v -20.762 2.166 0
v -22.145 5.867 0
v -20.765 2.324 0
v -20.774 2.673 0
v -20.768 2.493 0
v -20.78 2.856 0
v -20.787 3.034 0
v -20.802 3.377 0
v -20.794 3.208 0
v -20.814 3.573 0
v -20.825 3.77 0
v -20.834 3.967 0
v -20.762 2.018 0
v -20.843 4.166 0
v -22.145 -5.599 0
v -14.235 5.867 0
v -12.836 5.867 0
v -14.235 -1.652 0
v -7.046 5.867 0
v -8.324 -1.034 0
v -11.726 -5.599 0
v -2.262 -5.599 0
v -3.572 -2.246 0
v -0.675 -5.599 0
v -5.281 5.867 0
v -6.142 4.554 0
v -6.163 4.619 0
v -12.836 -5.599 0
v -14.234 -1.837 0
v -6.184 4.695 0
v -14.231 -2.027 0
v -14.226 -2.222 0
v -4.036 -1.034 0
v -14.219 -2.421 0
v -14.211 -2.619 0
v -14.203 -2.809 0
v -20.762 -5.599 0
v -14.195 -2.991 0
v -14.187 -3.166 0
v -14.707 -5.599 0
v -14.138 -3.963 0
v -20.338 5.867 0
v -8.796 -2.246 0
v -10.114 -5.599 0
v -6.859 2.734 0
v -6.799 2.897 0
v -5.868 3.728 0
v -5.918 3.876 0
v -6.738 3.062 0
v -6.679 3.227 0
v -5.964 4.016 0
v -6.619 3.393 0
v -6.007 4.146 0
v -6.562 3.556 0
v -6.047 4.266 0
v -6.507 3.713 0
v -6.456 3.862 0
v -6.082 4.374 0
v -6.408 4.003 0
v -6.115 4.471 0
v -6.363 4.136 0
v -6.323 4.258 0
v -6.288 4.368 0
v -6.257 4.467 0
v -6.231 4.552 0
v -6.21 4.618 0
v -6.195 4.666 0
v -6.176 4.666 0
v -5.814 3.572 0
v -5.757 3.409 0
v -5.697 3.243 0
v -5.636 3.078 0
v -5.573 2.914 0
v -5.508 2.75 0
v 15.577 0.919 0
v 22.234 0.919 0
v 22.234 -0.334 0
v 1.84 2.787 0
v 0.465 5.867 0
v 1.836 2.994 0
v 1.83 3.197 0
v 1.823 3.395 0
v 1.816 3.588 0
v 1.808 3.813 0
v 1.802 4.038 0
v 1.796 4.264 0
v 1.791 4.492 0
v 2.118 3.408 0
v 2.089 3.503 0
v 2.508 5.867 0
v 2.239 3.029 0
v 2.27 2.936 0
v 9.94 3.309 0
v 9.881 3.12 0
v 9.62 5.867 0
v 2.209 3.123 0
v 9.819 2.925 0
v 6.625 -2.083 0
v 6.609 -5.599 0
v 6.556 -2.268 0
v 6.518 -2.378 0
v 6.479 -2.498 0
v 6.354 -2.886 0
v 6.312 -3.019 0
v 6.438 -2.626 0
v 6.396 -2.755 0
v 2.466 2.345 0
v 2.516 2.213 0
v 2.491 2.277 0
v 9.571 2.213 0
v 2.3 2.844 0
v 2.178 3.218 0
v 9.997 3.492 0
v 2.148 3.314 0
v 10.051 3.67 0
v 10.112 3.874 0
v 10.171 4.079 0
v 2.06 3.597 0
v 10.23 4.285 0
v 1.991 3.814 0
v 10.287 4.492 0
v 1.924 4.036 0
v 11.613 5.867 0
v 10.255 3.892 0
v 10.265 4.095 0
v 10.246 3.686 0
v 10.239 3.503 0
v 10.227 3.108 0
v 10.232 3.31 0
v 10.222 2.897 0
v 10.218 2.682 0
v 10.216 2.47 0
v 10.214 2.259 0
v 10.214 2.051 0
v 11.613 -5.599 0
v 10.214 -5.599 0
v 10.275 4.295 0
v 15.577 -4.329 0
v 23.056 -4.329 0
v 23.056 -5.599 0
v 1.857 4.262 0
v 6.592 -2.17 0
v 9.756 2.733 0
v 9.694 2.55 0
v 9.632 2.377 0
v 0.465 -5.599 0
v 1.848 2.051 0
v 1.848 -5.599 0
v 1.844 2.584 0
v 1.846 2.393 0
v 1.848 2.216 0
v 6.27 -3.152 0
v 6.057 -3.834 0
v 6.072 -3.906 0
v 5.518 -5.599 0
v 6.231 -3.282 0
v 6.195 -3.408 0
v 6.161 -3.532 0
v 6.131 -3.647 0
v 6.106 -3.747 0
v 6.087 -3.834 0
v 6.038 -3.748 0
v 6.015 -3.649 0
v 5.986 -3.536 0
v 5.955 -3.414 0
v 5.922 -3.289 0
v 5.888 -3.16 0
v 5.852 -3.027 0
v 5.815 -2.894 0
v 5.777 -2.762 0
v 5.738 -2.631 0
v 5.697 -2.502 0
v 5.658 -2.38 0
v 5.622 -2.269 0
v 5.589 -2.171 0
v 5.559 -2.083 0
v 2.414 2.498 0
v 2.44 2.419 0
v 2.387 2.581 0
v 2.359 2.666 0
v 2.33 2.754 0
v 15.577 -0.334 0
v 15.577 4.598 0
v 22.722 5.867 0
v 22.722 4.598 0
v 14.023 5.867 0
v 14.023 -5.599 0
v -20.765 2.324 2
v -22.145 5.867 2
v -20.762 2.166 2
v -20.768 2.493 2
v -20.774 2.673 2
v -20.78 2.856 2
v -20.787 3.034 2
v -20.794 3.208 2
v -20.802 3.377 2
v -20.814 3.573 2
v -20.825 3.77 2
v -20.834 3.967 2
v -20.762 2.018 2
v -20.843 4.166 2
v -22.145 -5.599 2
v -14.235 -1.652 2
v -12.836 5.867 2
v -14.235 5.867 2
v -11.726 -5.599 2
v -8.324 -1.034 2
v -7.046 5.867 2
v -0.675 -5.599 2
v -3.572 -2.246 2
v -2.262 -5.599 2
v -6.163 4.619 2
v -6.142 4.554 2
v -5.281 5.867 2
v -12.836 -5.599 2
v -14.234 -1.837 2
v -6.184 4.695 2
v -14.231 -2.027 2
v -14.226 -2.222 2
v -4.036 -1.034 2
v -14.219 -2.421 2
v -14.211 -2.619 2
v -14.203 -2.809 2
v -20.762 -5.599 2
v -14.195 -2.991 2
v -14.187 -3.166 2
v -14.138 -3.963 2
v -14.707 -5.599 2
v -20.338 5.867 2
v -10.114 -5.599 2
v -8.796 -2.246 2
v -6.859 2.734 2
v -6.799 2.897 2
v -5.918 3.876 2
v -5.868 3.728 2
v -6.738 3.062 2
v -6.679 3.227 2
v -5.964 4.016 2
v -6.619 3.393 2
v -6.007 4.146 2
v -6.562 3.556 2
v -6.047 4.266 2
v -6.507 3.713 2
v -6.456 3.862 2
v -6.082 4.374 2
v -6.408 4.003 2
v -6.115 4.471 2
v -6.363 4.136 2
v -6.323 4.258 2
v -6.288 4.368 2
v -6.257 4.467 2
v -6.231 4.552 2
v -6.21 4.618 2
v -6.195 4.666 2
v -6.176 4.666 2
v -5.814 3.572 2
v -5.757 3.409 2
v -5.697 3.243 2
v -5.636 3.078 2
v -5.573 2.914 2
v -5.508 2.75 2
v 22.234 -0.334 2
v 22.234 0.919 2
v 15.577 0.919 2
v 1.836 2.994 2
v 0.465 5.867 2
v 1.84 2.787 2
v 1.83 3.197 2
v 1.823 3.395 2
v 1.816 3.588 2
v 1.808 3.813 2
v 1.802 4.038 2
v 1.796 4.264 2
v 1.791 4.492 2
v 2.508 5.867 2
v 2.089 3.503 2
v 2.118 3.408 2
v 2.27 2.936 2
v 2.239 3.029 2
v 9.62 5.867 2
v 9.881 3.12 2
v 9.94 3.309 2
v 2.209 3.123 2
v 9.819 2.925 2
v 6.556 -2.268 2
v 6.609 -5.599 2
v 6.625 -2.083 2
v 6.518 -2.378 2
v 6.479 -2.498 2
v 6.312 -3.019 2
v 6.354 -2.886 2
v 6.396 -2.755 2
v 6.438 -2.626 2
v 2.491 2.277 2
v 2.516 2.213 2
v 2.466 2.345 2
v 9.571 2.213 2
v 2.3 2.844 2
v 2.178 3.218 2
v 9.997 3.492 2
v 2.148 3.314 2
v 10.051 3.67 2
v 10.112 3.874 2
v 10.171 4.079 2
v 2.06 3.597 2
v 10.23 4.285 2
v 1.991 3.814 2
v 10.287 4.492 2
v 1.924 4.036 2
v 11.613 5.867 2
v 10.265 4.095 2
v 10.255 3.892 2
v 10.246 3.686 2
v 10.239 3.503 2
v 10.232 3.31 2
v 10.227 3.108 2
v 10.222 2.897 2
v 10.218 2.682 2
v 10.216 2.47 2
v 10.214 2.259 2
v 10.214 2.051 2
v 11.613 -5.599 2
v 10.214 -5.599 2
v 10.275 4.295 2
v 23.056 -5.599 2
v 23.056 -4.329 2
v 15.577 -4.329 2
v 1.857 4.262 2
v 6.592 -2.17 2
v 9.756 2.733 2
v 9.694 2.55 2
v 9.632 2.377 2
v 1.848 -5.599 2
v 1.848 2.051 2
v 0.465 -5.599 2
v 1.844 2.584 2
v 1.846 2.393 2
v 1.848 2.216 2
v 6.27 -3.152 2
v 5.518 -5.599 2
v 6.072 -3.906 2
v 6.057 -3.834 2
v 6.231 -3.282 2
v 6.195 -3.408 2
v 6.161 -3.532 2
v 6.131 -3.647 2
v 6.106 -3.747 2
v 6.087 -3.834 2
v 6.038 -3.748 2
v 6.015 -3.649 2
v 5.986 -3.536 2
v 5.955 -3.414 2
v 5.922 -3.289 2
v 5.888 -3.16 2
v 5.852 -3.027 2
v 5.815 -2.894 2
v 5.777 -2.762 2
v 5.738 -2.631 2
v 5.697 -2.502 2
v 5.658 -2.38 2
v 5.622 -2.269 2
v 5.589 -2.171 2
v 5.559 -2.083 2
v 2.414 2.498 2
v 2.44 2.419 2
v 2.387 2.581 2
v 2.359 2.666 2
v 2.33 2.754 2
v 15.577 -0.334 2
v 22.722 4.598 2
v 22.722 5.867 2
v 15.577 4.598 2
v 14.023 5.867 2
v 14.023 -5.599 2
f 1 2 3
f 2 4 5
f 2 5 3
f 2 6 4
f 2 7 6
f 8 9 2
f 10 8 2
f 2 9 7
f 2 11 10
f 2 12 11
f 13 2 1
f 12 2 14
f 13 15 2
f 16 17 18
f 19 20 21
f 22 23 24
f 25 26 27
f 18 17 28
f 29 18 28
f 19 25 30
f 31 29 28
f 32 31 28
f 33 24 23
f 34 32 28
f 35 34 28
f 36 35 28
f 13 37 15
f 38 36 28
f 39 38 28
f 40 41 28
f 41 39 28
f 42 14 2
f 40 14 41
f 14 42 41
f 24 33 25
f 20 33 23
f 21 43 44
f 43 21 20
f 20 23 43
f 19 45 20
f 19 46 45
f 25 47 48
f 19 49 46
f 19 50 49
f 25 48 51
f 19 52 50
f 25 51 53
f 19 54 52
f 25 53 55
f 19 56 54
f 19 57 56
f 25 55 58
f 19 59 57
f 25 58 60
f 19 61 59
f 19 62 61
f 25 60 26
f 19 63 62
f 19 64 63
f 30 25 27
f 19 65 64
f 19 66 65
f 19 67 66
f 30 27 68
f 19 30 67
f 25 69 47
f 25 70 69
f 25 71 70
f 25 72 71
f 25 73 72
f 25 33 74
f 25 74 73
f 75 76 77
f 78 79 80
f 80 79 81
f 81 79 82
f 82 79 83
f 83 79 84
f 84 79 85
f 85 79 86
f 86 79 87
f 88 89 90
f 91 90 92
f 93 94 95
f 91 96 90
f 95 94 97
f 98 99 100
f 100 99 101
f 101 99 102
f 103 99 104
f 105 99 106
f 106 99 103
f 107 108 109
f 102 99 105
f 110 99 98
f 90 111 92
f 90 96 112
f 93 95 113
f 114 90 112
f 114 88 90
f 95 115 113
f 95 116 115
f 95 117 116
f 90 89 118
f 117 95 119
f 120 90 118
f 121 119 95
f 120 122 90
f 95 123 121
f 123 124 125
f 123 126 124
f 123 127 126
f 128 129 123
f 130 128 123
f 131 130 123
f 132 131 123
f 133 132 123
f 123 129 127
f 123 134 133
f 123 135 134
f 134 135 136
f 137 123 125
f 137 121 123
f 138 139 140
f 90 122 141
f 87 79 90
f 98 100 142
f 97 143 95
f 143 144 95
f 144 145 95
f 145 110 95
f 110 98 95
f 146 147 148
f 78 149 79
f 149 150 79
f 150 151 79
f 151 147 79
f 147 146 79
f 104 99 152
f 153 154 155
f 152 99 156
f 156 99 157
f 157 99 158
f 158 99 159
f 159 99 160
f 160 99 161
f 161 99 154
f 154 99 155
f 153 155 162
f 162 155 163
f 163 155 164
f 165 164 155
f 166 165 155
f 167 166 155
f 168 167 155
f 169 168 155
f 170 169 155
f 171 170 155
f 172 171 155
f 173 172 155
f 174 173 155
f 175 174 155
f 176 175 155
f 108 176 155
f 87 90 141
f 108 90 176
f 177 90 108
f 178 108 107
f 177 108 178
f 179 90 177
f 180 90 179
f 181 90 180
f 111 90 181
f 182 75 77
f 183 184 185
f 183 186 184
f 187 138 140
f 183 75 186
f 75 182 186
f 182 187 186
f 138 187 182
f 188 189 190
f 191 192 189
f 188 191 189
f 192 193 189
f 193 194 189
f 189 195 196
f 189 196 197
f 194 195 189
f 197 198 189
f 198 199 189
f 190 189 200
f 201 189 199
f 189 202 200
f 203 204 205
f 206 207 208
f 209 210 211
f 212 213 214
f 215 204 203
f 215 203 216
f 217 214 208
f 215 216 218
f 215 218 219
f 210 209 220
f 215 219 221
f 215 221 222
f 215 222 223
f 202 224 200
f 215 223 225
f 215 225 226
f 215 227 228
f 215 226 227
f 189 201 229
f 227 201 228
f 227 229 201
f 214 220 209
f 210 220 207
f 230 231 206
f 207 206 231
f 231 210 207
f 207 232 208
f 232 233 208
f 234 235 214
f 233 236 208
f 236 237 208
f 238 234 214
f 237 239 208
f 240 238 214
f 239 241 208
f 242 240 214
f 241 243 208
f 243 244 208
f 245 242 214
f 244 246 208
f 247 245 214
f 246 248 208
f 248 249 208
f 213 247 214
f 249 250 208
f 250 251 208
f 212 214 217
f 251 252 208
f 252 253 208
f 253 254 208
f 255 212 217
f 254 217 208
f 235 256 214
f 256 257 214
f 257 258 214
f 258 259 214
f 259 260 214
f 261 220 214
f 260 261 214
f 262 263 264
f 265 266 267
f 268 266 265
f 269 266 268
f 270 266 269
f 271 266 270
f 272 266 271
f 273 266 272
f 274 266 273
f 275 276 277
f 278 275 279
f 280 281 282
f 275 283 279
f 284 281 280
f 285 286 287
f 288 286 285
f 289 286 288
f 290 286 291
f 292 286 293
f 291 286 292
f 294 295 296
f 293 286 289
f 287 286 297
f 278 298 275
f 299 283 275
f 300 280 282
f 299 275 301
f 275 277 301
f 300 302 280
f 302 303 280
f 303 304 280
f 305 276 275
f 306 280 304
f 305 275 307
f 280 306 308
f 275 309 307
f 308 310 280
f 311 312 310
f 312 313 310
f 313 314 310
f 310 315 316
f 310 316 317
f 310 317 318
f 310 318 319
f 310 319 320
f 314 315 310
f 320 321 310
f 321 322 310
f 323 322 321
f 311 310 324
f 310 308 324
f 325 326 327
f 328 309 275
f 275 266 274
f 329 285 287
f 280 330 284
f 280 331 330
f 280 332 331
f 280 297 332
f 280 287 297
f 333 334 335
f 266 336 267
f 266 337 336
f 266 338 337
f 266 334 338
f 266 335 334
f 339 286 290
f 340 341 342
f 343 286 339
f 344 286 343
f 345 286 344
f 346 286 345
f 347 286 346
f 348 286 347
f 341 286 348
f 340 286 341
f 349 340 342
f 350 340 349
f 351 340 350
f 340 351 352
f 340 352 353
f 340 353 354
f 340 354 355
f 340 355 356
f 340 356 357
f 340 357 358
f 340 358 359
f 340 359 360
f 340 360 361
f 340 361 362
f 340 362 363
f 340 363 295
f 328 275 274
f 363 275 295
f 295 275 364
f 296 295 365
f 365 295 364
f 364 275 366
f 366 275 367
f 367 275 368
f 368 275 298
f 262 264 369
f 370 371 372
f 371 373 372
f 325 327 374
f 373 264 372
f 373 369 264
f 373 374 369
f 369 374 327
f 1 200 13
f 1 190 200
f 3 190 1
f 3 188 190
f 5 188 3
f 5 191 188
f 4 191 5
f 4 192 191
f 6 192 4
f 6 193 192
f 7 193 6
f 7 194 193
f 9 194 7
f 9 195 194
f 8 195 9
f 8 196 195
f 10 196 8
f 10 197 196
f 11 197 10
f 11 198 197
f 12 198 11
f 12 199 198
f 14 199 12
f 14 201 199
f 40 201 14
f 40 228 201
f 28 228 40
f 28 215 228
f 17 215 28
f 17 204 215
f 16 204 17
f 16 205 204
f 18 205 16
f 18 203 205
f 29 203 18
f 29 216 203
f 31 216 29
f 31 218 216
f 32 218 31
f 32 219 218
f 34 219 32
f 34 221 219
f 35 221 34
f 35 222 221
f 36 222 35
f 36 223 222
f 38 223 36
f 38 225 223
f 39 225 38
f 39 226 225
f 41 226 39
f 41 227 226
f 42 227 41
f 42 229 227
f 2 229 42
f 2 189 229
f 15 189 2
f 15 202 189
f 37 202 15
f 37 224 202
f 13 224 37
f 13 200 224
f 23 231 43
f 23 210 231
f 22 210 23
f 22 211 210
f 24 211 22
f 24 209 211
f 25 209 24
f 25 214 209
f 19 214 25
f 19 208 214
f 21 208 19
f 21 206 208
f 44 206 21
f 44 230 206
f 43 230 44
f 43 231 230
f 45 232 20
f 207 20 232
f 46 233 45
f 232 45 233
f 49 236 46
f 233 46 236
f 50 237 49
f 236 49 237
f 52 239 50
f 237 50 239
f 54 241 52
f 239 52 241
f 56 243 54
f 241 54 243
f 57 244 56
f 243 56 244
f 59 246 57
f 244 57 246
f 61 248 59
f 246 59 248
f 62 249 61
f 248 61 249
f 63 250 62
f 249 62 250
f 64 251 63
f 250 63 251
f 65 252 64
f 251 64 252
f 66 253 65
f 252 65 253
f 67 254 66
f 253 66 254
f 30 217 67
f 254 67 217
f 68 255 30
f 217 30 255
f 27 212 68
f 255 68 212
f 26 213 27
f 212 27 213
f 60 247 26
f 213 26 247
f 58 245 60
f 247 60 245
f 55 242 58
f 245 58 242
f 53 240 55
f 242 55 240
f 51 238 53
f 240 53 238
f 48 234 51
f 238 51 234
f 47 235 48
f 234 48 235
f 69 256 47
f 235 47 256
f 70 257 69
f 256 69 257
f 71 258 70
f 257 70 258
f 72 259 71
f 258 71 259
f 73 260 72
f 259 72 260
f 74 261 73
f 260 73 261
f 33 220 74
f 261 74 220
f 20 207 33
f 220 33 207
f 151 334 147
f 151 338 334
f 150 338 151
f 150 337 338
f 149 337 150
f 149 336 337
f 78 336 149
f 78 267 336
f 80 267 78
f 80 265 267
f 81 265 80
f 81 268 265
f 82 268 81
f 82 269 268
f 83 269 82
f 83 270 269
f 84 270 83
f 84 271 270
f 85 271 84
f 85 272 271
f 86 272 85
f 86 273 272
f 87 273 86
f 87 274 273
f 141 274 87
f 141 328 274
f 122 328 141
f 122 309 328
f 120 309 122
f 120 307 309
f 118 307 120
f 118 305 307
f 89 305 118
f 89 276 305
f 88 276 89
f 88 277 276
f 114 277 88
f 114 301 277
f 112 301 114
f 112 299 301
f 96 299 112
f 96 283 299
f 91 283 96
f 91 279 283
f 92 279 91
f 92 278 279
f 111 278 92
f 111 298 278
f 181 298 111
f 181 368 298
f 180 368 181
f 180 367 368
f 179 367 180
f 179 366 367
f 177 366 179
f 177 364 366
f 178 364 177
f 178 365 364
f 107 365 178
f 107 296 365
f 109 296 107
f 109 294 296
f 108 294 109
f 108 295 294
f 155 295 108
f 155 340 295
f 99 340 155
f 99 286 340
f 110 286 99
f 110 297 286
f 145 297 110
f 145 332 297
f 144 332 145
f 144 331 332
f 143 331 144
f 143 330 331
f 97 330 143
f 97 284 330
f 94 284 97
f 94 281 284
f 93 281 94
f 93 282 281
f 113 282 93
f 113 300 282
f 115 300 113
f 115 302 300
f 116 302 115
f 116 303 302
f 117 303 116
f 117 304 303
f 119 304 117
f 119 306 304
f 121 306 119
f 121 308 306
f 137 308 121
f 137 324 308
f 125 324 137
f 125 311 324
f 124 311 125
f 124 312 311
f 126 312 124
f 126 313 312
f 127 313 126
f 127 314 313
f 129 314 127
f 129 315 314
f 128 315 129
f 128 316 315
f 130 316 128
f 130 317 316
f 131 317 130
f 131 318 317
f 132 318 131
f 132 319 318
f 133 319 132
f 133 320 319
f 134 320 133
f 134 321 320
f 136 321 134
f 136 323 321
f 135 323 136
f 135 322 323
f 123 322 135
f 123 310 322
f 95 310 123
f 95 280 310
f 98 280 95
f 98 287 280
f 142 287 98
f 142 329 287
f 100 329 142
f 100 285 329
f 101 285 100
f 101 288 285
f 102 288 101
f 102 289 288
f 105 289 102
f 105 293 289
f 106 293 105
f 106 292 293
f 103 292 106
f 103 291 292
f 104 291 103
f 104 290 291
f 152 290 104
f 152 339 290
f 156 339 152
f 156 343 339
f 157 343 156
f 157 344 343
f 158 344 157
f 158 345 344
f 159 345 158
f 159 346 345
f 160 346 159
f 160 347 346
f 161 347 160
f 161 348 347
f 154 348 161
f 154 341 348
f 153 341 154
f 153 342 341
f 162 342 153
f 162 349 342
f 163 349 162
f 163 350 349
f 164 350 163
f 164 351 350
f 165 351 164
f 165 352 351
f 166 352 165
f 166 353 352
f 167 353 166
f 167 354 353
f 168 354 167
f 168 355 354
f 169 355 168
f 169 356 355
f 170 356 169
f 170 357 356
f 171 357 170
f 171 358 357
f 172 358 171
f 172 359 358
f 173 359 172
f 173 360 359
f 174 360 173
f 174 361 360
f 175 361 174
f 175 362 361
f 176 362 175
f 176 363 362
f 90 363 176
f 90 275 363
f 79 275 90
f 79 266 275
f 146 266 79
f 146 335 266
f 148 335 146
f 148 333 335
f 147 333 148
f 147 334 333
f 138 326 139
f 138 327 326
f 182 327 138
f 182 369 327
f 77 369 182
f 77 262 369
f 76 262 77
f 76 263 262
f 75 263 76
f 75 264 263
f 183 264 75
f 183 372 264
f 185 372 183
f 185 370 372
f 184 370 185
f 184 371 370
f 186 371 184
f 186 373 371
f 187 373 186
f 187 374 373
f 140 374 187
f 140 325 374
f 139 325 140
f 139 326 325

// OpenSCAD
linear_extrude(height = 2) {
  text("NAME", size = 12, halign = "center", valign = "center");
}
